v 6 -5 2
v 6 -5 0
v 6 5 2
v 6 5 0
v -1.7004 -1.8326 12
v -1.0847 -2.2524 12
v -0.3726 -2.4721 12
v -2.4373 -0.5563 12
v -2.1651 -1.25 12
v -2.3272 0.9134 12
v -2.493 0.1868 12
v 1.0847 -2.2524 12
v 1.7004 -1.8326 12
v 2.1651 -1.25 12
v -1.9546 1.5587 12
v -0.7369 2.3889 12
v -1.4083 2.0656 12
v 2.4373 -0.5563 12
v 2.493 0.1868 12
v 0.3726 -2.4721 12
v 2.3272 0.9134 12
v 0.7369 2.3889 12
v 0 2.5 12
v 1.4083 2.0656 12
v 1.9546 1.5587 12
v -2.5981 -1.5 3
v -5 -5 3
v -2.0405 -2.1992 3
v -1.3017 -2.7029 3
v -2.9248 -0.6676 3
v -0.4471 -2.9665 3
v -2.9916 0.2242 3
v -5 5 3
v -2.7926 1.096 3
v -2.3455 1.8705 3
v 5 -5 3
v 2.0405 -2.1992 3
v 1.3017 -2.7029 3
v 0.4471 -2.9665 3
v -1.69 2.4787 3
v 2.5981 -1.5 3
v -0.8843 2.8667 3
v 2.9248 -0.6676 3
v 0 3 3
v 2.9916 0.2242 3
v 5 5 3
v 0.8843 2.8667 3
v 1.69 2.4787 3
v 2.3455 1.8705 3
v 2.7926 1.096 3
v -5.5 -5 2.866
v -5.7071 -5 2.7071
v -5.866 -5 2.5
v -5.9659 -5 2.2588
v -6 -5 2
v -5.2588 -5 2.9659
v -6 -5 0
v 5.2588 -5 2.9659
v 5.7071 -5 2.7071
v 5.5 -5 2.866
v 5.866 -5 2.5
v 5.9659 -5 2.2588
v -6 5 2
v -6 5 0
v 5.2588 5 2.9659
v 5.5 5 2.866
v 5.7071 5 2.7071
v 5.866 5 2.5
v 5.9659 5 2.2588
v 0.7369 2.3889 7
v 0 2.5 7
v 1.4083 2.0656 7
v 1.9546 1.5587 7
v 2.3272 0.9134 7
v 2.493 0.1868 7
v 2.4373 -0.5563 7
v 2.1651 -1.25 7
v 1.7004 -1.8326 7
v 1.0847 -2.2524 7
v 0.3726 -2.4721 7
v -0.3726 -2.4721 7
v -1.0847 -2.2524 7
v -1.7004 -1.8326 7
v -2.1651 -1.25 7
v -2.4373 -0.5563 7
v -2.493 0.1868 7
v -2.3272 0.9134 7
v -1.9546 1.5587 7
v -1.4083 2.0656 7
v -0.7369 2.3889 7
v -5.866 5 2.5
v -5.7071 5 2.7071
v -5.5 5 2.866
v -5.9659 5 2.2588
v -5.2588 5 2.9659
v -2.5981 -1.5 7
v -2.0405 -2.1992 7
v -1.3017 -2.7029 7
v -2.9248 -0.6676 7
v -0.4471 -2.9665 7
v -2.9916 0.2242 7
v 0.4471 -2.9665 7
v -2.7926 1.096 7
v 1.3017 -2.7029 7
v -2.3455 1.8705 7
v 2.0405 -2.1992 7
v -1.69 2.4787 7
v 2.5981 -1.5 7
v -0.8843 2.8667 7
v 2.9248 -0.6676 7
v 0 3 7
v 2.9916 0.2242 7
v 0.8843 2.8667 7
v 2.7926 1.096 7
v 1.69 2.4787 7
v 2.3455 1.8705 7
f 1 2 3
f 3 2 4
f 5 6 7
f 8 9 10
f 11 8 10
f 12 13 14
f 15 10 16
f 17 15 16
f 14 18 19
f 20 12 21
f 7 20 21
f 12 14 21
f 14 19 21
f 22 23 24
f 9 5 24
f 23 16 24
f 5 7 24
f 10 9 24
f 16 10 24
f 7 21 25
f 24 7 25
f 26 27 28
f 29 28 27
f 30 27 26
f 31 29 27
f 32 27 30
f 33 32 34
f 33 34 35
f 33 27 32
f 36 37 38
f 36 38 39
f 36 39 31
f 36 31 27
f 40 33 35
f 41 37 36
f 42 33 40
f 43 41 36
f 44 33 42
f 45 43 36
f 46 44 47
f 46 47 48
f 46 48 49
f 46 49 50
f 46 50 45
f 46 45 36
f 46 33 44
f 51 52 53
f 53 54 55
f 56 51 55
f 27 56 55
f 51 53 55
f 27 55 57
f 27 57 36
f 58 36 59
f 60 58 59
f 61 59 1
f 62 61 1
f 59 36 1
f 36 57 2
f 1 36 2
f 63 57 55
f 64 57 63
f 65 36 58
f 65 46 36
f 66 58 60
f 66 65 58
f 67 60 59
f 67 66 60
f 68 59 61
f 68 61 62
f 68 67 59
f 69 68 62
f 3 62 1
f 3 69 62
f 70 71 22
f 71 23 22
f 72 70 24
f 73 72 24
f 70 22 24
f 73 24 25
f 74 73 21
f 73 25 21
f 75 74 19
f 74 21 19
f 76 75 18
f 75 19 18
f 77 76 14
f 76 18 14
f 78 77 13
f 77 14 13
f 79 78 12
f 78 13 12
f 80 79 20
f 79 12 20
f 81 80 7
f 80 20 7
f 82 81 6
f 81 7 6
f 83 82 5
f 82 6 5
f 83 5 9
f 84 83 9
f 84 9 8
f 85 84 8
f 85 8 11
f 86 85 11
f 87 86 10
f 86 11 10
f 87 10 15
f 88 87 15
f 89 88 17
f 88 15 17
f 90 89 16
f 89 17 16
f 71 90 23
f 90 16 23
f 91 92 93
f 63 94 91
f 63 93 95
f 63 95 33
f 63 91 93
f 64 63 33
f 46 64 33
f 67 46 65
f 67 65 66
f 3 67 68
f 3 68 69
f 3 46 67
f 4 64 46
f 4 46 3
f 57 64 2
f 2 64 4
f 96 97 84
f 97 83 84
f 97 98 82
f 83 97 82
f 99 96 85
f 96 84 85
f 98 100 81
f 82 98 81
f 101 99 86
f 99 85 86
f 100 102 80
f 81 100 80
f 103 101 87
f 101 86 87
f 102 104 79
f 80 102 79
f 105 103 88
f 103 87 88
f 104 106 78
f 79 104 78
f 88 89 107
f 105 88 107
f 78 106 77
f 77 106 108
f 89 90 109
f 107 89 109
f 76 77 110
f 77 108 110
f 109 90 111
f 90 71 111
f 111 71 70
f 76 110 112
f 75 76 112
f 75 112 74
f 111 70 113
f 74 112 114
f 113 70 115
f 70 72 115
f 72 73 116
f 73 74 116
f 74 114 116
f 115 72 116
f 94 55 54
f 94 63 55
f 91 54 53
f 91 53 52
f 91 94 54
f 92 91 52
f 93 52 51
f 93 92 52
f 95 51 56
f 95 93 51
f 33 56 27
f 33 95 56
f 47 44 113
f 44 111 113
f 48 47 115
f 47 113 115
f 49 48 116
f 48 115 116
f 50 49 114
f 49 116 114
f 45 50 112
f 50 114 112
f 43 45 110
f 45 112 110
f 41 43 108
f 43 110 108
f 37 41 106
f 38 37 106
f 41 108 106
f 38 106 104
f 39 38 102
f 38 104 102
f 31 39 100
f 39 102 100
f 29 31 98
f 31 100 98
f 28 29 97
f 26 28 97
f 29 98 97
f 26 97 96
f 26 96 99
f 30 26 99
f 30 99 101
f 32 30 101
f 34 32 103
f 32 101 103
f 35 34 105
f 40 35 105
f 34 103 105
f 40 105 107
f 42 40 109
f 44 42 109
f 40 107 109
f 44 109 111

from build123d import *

# Parameters (mm, degrees)
SKETCH2_W           = 12
SKETCH2_H           = 10
BOSS_EXTRUDE1_DEPTH = 3
FILLET1_R           = 1


with BuildPart() as part:
    # Sketch2 → Boss-Extrude1 (new body)
    with BuildSketch(Plane.XY):
        Rectangle(SKETCH2_W, SKETCH2_H)
    extrude(amount=BOSS_EXTRUDE1_DEPTH)

    # Sketch3 → Revolve1 (revolve)
    with BuildSketch(Plane(origin=(0, 0, 0), x_dir=(0, 0, -1), z_dir=(1, 0, 0))):
        Polygon((-3, 0), (-3, 3), (-7, 3), (-7, 2.5), (-12, 2.5), (-12, 0), align=None)
    revolve(axis=Axis((0, 0, 12), (0, 0, -1)))

    # Fillet1
    fillet1_edges = [part.edges().sort_by_distance(p)[0] for p in [
        (-6, 0, 3),
        (6, 0, 3),
    ]]
    fillet(fillet1_edges, radius=FILLET1_R)


solid = part.part
